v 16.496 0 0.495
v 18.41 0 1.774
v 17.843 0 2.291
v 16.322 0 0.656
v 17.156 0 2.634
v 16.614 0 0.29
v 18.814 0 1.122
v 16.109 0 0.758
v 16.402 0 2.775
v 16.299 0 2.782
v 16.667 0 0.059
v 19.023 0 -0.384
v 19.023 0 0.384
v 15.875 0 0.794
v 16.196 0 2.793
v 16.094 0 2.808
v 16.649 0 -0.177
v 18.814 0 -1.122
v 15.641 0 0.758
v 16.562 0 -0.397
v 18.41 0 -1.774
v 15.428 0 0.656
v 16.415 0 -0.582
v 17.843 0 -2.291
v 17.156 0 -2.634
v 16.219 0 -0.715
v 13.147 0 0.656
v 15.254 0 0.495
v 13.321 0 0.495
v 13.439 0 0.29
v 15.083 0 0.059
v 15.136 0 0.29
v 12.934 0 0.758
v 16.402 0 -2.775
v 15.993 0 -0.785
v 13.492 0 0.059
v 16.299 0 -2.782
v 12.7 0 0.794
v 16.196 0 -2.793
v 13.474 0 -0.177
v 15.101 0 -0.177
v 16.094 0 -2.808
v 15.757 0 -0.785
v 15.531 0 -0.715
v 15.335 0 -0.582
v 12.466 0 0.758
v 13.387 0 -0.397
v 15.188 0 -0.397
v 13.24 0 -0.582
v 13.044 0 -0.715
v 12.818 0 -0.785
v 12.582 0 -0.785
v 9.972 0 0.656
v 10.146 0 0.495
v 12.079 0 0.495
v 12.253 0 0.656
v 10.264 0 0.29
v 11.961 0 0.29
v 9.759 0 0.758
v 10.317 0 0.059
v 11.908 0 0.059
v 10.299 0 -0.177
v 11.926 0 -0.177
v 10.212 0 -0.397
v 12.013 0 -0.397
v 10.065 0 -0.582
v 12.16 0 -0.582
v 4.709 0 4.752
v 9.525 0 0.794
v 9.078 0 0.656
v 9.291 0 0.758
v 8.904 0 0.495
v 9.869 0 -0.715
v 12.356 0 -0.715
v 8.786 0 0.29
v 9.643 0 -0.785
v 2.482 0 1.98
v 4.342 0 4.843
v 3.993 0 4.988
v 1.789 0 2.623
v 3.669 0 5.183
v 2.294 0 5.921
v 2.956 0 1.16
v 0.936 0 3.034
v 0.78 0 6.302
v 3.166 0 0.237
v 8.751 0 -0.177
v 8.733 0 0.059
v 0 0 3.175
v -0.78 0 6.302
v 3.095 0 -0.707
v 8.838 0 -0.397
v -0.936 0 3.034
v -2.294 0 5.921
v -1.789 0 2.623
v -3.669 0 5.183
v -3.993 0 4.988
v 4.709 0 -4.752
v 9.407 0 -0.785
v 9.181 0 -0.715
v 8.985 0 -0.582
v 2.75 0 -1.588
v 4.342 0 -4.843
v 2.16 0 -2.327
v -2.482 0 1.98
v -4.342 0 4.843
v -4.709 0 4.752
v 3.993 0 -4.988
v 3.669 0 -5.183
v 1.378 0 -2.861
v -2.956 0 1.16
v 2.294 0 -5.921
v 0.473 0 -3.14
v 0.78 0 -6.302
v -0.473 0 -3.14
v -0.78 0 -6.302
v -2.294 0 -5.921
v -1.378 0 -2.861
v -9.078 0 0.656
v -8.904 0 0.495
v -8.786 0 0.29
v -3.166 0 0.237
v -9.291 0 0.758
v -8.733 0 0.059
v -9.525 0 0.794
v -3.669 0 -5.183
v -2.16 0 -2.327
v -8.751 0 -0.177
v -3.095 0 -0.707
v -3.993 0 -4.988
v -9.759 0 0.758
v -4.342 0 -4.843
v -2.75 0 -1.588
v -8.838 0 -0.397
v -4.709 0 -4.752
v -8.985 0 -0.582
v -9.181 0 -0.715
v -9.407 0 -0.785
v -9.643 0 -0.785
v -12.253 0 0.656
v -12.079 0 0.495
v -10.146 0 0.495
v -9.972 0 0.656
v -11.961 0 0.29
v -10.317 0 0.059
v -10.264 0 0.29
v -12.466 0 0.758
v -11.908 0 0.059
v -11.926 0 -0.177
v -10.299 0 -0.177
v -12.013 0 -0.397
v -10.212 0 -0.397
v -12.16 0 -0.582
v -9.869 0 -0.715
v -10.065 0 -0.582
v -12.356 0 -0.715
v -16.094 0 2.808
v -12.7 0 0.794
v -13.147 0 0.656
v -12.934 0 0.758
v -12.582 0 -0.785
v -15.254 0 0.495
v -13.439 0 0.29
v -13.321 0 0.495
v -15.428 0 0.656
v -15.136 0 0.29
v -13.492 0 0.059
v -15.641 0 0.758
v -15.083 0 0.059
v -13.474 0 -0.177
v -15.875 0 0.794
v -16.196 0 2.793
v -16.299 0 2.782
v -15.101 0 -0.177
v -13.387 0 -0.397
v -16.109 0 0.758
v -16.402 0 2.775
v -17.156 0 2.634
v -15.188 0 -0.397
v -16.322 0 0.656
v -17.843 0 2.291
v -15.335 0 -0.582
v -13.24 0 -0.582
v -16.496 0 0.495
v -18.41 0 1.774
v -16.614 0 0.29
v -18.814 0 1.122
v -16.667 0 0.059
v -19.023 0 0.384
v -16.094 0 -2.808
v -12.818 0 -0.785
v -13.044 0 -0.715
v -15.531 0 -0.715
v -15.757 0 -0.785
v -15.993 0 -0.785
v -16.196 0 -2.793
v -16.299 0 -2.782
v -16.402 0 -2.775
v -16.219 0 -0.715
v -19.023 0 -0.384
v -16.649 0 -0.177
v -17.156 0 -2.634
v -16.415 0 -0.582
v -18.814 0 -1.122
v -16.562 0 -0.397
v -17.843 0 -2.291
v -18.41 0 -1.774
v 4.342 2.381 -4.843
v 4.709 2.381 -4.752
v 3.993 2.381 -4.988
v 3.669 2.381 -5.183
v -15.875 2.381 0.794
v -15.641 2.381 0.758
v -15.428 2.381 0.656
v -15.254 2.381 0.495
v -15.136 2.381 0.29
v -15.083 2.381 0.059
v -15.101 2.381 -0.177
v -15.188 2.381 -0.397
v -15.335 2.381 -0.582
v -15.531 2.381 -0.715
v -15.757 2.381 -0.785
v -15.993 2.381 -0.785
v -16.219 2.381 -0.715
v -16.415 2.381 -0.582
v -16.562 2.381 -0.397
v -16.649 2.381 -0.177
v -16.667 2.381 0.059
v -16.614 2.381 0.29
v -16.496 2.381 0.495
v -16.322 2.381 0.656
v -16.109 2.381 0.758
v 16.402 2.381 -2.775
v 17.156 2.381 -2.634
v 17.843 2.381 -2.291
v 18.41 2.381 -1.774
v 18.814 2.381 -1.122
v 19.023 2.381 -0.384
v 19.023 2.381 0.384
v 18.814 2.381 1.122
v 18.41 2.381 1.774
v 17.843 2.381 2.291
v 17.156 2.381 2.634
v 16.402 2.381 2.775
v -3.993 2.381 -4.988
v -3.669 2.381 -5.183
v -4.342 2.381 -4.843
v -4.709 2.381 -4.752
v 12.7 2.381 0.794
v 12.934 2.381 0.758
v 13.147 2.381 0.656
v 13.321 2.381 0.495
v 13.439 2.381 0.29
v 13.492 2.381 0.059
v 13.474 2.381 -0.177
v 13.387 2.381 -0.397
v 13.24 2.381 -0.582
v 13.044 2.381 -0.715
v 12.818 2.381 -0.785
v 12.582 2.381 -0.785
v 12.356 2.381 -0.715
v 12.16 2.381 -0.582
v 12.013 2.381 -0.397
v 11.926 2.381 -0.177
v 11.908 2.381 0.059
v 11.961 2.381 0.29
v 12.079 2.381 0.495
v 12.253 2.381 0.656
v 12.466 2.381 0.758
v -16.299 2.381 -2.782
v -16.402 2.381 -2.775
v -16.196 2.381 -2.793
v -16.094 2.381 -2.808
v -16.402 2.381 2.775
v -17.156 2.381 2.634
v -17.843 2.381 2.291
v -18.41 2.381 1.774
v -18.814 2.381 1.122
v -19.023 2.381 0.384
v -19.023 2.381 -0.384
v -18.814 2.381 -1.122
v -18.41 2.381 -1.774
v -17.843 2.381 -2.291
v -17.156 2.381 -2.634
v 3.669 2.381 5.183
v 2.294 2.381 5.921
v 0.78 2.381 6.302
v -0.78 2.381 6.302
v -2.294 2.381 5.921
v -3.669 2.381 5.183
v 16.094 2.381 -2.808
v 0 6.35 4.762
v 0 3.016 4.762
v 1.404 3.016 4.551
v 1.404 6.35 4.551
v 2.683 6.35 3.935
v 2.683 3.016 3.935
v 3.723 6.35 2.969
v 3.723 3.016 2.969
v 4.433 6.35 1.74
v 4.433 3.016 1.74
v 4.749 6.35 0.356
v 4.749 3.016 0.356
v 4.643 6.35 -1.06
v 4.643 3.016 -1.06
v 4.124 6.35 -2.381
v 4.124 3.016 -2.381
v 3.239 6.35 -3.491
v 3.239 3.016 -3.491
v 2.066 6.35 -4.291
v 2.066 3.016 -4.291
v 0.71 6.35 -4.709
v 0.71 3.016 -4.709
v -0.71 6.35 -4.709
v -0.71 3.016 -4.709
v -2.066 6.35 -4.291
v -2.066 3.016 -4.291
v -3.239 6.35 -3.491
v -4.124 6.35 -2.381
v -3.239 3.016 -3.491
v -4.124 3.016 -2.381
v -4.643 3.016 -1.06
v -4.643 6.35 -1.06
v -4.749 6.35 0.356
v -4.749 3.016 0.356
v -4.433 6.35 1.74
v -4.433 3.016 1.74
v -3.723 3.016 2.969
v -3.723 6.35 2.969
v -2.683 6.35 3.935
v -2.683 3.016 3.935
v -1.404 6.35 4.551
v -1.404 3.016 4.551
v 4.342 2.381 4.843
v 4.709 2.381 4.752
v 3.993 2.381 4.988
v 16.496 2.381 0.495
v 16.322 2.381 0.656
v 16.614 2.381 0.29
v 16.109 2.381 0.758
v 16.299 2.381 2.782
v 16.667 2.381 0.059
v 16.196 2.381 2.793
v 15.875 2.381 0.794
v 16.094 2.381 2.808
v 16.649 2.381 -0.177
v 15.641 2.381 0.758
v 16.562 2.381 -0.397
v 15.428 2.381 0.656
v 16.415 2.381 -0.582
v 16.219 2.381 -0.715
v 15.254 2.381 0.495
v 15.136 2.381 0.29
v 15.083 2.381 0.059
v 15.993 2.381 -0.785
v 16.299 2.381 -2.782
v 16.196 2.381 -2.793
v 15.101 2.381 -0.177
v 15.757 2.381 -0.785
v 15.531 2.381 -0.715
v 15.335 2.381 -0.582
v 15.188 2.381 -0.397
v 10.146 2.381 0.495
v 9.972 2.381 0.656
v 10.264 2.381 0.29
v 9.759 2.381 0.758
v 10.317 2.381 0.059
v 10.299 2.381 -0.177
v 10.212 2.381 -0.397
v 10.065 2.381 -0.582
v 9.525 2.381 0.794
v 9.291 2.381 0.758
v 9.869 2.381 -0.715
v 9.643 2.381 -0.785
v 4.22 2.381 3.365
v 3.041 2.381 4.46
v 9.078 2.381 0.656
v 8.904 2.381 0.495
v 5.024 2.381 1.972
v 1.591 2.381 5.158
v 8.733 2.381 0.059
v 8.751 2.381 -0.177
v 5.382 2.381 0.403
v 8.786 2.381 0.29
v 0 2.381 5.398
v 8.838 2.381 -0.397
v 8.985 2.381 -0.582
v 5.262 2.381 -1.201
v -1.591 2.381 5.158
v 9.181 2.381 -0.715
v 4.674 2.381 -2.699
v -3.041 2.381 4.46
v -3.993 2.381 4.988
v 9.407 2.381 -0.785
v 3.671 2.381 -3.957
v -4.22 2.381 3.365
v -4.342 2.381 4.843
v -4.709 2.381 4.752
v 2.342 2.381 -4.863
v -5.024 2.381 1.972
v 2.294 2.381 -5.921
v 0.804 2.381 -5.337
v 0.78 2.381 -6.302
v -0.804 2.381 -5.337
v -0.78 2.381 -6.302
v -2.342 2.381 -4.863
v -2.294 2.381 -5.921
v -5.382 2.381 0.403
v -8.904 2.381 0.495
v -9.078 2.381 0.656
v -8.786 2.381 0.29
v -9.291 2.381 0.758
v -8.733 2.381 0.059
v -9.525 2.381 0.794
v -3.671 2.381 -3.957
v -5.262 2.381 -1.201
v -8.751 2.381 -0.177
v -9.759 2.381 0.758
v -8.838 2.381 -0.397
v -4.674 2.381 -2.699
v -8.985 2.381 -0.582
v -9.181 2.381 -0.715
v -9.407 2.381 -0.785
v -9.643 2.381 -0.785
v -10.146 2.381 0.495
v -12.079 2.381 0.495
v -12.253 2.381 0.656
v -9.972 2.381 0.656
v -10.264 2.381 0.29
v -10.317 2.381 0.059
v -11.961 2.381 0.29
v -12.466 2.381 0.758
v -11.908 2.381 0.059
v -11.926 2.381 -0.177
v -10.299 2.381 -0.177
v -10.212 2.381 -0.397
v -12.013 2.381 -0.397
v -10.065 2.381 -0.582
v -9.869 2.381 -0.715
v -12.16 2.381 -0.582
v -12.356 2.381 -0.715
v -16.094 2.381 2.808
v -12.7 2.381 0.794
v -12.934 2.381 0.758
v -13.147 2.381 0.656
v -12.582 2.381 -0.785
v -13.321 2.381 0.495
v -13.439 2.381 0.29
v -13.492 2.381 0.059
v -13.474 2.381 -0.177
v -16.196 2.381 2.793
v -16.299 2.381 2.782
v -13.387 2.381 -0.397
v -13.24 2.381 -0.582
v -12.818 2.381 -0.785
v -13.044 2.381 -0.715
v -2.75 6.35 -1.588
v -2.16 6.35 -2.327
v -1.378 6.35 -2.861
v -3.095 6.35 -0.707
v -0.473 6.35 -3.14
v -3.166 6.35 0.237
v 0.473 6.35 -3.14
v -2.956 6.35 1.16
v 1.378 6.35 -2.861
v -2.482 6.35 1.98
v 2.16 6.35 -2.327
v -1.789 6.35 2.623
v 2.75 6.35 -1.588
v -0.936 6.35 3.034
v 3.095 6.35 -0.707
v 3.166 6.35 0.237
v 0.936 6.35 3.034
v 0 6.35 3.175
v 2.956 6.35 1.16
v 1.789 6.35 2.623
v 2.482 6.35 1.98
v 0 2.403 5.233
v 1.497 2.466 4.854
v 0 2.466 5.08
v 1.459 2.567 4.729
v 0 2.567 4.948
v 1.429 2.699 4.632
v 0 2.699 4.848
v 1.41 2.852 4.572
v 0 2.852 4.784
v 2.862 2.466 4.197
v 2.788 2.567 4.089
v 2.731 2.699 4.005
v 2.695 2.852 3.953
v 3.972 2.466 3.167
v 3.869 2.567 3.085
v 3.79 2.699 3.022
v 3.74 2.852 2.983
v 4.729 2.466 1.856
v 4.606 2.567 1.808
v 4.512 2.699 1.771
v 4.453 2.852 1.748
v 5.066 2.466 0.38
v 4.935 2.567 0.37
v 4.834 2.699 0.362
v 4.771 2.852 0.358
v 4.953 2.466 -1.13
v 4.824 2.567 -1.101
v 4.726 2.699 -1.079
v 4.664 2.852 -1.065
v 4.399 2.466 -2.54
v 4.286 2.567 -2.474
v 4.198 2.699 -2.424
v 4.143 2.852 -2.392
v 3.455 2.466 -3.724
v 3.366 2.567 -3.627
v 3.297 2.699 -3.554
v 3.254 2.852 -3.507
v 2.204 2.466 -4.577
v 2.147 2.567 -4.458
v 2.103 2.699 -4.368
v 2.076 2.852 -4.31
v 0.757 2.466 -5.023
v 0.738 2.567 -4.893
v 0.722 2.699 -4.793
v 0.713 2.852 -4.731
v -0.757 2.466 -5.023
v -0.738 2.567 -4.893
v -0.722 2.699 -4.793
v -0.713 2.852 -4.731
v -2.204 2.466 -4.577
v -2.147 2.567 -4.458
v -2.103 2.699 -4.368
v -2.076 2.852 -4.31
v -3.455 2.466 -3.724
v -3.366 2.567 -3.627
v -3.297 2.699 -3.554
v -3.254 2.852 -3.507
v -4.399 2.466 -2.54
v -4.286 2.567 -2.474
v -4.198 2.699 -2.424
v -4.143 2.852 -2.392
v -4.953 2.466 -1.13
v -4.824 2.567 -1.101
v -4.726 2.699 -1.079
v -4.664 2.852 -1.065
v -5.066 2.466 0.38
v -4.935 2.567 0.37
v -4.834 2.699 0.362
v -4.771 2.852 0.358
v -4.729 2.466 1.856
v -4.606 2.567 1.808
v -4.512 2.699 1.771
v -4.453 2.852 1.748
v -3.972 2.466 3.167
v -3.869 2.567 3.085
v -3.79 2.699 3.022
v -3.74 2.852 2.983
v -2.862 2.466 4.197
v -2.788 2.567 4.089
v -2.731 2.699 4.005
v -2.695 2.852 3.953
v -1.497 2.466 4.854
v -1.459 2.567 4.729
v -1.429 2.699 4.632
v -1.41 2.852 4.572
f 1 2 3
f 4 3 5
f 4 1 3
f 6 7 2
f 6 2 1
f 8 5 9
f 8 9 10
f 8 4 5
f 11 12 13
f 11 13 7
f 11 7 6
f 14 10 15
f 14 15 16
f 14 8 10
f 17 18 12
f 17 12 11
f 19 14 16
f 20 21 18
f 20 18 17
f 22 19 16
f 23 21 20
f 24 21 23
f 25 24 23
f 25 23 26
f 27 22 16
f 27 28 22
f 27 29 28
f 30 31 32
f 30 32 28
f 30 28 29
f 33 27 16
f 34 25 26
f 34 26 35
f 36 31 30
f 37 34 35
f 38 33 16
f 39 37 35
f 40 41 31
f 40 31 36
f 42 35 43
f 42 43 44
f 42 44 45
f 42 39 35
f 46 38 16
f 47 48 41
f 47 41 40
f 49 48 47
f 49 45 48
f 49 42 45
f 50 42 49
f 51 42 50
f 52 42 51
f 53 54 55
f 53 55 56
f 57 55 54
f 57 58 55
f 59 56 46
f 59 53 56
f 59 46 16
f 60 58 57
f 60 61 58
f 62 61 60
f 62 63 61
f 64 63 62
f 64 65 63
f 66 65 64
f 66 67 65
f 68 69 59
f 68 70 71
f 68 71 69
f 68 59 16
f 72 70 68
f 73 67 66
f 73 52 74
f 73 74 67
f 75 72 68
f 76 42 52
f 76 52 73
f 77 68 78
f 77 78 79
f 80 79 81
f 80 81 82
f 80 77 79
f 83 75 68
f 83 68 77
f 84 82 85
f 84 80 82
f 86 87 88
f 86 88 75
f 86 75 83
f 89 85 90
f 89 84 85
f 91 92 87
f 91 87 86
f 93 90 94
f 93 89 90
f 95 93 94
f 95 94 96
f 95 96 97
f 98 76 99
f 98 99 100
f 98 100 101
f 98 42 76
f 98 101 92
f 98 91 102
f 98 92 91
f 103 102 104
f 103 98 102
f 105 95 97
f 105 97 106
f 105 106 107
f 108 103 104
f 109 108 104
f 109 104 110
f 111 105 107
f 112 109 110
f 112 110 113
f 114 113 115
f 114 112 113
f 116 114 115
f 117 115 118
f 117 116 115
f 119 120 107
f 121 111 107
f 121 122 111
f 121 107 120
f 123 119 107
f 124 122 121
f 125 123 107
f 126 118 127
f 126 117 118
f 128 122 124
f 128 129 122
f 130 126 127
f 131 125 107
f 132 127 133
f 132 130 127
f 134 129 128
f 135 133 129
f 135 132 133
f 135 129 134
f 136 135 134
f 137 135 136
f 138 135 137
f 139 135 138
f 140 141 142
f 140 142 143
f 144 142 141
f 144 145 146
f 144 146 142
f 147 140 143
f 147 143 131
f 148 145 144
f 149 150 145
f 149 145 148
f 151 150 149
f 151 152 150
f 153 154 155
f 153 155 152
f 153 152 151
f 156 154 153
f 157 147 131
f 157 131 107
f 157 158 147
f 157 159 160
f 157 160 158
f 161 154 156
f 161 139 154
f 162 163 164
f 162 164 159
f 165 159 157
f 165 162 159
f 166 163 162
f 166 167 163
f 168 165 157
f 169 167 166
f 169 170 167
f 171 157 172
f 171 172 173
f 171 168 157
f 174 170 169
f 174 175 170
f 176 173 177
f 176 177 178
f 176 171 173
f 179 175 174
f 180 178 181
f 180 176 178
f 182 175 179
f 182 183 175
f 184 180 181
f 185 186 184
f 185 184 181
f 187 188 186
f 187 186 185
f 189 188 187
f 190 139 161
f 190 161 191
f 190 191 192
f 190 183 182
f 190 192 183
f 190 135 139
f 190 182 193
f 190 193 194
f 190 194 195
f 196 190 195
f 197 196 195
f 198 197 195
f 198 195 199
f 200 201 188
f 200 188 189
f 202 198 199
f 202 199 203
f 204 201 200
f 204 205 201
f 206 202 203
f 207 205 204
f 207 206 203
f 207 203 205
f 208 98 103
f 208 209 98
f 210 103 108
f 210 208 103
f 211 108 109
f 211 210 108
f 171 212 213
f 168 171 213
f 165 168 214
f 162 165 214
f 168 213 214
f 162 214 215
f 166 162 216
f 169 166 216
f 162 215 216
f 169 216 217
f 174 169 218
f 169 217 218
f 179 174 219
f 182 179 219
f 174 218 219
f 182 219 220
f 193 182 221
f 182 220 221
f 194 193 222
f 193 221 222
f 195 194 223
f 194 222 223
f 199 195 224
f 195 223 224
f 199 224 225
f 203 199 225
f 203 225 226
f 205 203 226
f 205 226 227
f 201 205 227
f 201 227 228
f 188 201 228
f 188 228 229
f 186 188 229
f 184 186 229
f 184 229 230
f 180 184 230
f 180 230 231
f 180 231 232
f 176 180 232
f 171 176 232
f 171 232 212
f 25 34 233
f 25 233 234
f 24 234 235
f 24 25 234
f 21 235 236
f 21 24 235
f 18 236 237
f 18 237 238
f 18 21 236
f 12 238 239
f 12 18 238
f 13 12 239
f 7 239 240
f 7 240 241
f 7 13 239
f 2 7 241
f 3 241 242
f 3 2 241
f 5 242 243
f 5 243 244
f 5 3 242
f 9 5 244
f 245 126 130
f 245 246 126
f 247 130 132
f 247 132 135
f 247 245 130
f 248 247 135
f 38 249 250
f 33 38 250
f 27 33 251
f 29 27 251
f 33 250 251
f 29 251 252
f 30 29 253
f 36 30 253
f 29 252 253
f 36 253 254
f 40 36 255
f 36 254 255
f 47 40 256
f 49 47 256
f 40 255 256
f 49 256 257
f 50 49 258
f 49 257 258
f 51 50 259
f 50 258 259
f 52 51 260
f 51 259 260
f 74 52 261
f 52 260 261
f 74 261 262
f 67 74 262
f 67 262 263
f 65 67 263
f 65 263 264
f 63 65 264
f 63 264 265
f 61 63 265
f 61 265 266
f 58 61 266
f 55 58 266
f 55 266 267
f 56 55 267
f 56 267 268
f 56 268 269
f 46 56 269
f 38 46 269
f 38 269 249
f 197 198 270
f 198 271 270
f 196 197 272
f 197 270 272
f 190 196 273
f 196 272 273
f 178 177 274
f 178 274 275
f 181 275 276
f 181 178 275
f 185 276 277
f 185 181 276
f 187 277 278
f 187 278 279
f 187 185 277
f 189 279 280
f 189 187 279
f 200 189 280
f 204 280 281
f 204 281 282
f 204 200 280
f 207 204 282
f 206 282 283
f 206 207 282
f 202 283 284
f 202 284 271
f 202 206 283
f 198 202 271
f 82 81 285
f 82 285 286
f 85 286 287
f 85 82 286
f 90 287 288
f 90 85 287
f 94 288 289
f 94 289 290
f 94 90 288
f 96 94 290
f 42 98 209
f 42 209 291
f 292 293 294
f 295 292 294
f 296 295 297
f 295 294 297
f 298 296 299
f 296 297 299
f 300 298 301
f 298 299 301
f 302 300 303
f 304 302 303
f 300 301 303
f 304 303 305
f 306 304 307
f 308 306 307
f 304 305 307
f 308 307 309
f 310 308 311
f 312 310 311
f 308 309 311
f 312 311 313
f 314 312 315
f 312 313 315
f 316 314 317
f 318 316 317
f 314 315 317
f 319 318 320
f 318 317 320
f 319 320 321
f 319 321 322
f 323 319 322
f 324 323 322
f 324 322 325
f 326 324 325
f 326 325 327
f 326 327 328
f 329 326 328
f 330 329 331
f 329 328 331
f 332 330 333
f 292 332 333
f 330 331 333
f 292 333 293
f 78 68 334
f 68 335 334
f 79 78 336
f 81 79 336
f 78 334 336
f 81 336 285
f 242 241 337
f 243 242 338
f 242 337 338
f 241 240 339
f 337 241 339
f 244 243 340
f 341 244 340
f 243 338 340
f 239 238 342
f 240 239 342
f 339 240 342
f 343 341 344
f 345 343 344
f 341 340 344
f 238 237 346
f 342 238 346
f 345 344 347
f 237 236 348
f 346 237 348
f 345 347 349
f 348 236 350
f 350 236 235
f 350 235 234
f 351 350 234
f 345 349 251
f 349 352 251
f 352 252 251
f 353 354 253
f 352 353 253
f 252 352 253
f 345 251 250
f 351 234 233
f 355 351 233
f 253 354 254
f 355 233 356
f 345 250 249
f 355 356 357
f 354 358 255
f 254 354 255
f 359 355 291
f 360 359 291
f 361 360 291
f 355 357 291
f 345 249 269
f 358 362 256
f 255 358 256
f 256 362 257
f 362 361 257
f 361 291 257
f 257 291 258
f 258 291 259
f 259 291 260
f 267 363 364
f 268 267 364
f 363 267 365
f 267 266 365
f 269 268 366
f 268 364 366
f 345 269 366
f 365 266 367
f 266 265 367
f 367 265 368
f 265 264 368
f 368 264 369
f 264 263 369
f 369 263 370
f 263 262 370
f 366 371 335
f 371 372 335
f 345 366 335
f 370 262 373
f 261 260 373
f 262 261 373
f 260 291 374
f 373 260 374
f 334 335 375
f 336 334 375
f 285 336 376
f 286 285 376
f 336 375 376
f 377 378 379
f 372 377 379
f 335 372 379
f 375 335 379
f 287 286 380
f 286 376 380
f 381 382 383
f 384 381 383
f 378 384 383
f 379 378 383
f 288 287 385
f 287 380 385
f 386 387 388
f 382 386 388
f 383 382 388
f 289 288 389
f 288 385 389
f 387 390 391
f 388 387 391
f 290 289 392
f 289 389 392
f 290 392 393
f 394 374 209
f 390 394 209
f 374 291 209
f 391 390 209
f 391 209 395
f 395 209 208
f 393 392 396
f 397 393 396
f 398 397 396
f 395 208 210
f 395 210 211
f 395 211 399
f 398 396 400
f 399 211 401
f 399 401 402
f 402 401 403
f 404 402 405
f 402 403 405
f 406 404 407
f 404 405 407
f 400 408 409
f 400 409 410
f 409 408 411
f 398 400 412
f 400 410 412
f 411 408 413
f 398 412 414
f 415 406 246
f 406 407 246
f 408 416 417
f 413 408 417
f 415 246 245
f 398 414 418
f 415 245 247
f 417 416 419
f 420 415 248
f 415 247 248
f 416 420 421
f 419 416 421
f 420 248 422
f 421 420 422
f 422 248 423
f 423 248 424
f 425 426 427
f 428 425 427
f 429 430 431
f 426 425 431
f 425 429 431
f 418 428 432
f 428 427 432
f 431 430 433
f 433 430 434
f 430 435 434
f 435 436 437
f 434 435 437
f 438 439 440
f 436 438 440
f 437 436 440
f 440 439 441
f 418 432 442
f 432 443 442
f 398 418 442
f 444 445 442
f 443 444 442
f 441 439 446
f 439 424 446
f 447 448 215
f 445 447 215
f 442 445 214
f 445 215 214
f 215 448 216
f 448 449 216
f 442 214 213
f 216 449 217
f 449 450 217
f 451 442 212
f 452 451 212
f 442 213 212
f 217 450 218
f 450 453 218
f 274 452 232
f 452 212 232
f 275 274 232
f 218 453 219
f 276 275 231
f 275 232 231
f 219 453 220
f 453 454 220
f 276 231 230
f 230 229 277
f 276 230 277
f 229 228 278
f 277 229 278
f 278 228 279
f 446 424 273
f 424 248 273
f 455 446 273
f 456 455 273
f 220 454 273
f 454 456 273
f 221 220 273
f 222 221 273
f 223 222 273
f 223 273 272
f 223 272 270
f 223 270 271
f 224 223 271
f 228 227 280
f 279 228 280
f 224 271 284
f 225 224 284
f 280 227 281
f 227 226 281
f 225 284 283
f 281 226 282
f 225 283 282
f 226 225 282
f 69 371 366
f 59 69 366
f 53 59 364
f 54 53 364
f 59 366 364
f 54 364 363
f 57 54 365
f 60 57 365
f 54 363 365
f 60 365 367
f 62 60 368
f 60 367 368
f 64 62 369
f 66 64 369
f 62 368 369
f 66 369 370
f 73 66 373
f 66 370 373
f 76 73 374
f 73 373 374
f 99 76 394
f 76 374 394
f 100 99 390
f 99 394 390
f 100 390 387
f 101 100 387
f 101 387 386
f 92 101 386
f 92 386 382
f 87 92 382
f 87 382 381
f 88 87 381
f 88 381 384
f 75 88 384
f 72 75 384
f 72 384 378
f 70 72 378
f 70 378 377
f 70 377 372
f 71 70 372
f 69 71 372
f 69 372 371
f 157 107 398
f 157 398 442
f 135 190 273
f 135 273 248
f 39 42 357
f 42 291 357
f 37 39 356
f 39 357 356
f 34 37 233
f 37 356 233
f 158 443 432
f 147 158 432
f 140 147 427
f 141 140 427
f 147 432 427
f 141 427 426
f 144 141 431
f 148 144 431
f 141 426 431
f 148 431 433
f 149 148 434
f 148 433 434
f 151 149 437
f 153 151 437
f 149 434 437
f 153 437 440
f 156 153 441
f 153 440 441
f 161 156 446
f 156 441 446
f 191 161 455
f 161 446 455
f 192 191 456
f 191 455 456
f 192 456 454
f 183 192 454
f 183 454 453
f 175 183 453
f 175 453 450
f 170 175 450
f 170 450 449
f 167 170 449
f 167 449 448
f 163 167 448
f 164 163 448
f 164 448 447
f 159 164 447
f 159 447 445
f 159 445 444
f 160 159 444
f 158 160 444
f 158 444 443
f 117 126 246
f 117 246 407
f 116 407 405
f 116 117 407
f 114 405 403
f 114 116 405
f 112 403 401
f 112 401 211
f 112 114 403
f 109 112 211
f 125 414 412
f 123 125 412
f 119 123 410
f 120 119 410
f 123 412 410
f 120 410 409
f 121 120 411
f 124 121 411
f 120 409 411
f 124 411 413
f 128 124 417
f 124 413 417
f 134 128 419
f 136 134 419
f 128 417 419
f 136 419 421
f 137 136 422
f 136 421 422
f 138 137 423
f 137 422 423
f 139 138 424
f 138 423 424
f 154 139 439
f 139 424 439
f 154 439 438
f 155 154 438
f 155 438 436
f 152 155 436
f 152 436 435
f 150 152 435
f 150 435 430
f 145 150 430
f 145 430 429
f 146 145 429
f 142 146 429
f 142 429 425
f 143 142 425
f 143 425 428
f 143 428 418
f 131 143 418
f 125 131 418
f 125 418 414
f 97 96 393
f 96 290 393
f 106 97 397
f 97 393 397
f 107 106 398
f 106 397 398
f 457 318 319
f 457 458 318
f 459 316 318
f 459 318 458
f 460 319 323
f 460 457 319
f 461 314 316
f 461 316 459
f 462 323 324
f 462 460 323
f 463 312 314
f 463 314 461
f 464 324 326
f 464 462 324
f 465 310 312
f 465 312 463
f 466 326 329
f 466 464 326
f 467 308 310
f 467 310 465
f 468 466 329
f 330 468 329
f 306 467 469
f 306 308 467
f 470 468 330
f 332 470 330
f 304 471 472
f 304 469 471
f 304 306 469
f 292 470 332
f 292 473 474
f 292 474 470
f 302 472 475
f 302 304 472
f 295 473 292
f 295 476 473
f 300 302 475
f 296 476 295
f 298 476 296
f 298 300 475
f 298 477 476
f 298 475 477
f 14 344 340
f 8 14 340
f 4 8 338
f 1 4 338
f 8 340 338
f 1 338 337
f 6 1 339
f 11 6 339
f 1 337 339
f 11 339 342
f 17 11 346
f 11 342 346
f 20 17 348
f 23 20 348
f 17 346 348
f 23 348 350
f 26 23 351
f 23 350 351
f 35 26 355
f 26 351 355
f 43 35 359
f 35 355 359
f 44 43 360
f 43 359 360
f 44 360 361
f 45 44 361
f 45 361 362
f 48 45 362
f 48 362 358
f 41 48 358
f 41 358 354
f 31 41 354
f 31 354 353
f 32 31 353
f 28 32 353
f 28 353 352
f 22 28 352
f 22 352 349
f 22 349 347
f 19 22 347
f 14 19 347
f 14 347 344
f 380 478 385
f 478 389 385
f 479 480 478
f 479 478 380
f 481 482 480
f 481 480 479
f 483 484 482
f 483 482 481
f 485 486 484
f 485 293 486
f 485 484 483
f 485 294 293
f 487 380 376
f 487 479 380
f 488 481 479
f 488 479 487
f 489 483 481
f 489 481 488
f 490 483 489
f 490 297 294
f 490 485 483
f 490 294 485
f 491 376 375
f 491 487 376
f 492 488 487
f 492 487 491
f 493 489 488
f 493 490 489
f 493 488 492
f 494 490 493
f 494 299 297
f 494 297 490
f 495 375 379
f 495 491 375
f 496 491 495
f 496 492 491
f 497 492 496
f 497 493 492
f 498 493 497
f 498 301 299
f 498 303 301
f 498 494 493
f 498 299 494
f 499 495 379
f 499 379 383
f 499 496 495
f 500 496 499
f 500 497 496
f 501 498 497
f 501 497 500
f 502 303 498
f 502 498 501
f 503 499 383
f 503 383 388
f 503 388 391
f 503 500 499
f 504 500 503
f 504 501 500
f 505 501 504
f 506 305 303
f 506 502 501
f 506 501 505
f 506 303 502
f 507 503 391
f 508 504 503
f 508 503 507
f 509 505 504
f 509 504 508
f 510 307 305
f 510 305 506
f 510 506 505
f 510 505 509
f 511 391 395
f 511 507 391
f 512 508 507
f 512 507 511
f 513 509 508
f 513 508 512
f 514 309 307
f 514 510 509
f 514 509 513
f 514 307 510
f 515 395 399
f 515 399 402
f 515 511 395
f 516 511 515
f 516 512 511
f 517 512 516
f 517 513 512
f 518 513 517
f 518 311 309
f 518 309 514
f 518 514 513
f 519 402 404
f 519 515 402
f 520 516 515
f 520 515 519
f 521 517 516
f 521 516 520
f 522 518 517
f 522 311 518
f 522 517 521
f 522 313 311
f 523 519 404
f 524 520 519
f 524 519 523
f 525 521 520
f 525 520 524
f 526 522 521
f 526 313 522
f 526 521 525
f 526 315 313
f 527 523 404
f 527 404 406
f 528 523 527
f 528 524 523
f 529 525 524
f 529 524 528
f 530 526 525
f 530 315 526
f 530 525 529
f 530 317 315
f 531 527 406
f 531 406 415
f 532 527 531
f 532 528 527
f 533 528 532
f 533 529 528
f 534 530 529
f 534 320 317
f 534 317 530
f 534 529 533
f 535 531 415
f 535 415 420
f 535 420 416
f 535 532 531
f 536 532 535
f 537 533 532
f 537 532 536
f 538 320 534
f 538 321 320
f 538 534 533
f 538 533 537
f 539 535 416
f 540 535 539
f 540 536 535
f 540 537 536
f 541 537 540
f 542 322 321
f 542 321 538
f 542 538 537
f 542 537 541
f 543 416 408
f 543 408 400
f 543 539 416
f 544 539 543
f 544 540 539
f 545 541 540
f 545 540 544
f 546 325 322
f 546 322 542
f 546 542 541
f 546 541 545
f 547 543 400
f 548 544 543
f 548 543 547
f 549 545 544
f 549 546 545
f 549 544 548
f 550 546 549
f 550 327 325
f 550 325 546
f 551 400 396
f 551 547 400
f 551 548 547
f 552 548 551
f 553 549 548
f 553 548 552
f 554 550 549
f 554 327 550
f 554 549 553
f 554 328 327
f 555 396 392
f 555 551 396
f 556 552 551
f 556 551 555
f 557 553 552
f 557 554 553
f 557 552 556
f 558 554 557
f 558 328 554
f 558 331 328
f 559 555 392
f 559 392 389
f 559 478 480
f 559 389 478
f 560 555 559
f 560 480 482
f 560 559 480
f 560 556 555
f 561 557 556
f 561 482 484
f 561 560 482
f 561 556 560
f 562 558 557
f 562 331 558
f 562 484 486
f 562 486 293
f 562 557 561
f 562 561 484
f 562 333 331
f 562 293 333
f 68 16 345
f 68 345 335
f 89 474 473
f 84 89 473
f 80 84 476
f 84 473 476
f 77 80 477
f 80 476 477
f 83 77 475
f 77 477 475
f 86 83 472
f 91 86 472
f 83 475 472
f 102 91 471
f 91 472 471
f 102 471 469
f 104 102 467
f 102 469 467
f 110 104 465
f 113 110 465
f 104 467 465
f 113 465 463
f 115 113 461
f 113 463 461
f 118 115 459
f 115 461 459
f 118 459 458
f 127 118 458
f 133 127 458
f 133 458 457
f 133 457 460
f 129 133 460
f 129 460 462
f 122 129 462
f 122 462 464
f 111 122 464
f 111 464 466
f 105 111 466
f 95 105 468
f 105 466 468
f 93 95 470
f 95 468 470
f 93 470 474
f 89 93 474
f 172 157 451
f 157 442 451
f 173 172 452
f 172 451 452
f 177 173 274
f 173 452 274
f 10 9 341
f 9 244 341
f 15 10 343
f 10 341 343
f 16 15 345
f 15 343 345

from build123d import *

# Parameters (mm, degrees)
BOSS_EXTRUDE1_DEPTH = 2.38125
FILLET1_R           = 2.54
FILLET2_R           = 2.54
SKETCH2_R           = 4.7625
BOSS_EXTRUDE2_DEPTH = 3.96875
FILLET3_R           = 0.635
SKETCH3_R           = 3.175
CUT_EXTRUDE1_DEPTH  = 6.35
SKETCH4_R           = 0.79375
CUT_EXTRUDE2_DEPTH  = 6.35


with BuildPart() as part:
    # Sketch1 → Boss-Extrude1 (new body)
    with BuildSketch(Plane(origin=(0, 0, 0), x_dir=(1, 0, 0), z_dir=(0, 1, 0))):
        with BuildLine():
            Line((4.089179599, 4.858097386), (16.271875, 2.778125))
            ThreePointArc((16.271875, 2.778125), (19.05, 0), (16.271875, -2.778125))
            Line((16.271875, -2.778125), (4.089179599, -4.858097386))
            ThreePointArc((4.089179599, -4.858097386), (0, -6.35), (-4.089179599, -4.858097386))
            Line((-4.089179599, -4.858097386), (-16.271875, -2.778125))
            ThreePointArc((-16.271875, -2.778125), (-19.05, 0), (-16.271875, 2.778125))
            Line((-16.271875, 2.778125), (-4.089179599, 4.858097386))
            ThreePointArc((-4.089179599, 4.858097386), (0, 6.35), (4.089179599, 4.858097386))
        make_face()
    extrude(amount=BOSS_EXTRUDE1_DEPTH)

    # Fillet1
    fillet1_edges = [part.edges().sort_by_distance(p)[0] for p in [
        (16.271875, 1.190625, -2.778125),
        (16.271875, 1.190625, 2.778125),
        (-16.271875, 1.190625, 2.778125),
        (-16.271875, 1.190625, -2.778125),
    ]]
    fillet(fillet1_edges, radius=FILLET1_R)

    # Fillet2
    fillet2_edges = [part.edges().sort_by_distance(p)[0] for p in [
        (4.089179599, 1.190625, -4.858097386),
        (4.089179599, 1.190625, 4.858097386),
        (-4.089179599, 1.190625, 4.858097386),
        (-4.089179599, 1.190625, -4.858097386),
    ]]
    fillet(fillet2_edges, radius=FILLET2_R)

    # Sketch2 → Boss-Extrude2 (add)
    with BuildSketch(Plane(origin=(0, 2.38125, 0), x_dir=(1, 0, 0), z_dir=(0, 1, 0))):
        with Locations(Location((0, 0, 0), (0, 0, 270))):
            Circle(SKETCH2_R)
    extrude(amount=BOSS_EXTRUDE2_DEPTH)

    # Fillet3
    fillet3_edges = [part.edges().sort_by_distance(p)[0] for p in [
        (0, 2.38125, -4.7625),
    ]]
    fillet(fillet3_edges, radius=FILLET3_R)

    # Sketch3 → Cut-Extrude1 (cut)
    with BuildSketch(Plane(origin=(0, 6.35, 0), x_dir=(1, 0, 0), z_dir=(0, 1, 0))):
        with Locations(Location((0, 0, 0), (0, 0, 270))):
            Circle(SKETCH3_R)
    extrude(amount=-CUT_EXTRUDE1_DEPTH, mode=Mode.SUBTRACT)

    # Sketch4 → Cut-Extrude2 (cut)
    with BuildSketch(Plane(origin=(0, 2.38125, 0), x_dir=(1, 0, 0), z_dir=(0, 1, 0))):
        with Locations(Location((9.525, 0, 0), (0, 0, 270))):
            Circle(SKETCH4_R)
        with Locations(Location((-9.525, 0, 0), (0, 0, 270))):
            Circle(SKETCH4_R)
        with Locations(Location((12.7, 0, 0), (0, 0, 270))):
            Circle(SKETCH4_R)
        with Locations(Location((15.875, 0, 0), (0, 0, 270))):
            Circle(SKETCH4_R)
        with Locations(Location((-12.7, 0, 0), (0, 0, 270))):
            Circle(SKETCH4_R)
        with Locations(Location((-15.875, 0, 0), (0, 0, 270))):
            Circle(SKETCH4_R)
    extrude(amount=-CUT_EXTRUDE2_DEPTH, mode=Mode.SUBTRACT)


solid = part.part
